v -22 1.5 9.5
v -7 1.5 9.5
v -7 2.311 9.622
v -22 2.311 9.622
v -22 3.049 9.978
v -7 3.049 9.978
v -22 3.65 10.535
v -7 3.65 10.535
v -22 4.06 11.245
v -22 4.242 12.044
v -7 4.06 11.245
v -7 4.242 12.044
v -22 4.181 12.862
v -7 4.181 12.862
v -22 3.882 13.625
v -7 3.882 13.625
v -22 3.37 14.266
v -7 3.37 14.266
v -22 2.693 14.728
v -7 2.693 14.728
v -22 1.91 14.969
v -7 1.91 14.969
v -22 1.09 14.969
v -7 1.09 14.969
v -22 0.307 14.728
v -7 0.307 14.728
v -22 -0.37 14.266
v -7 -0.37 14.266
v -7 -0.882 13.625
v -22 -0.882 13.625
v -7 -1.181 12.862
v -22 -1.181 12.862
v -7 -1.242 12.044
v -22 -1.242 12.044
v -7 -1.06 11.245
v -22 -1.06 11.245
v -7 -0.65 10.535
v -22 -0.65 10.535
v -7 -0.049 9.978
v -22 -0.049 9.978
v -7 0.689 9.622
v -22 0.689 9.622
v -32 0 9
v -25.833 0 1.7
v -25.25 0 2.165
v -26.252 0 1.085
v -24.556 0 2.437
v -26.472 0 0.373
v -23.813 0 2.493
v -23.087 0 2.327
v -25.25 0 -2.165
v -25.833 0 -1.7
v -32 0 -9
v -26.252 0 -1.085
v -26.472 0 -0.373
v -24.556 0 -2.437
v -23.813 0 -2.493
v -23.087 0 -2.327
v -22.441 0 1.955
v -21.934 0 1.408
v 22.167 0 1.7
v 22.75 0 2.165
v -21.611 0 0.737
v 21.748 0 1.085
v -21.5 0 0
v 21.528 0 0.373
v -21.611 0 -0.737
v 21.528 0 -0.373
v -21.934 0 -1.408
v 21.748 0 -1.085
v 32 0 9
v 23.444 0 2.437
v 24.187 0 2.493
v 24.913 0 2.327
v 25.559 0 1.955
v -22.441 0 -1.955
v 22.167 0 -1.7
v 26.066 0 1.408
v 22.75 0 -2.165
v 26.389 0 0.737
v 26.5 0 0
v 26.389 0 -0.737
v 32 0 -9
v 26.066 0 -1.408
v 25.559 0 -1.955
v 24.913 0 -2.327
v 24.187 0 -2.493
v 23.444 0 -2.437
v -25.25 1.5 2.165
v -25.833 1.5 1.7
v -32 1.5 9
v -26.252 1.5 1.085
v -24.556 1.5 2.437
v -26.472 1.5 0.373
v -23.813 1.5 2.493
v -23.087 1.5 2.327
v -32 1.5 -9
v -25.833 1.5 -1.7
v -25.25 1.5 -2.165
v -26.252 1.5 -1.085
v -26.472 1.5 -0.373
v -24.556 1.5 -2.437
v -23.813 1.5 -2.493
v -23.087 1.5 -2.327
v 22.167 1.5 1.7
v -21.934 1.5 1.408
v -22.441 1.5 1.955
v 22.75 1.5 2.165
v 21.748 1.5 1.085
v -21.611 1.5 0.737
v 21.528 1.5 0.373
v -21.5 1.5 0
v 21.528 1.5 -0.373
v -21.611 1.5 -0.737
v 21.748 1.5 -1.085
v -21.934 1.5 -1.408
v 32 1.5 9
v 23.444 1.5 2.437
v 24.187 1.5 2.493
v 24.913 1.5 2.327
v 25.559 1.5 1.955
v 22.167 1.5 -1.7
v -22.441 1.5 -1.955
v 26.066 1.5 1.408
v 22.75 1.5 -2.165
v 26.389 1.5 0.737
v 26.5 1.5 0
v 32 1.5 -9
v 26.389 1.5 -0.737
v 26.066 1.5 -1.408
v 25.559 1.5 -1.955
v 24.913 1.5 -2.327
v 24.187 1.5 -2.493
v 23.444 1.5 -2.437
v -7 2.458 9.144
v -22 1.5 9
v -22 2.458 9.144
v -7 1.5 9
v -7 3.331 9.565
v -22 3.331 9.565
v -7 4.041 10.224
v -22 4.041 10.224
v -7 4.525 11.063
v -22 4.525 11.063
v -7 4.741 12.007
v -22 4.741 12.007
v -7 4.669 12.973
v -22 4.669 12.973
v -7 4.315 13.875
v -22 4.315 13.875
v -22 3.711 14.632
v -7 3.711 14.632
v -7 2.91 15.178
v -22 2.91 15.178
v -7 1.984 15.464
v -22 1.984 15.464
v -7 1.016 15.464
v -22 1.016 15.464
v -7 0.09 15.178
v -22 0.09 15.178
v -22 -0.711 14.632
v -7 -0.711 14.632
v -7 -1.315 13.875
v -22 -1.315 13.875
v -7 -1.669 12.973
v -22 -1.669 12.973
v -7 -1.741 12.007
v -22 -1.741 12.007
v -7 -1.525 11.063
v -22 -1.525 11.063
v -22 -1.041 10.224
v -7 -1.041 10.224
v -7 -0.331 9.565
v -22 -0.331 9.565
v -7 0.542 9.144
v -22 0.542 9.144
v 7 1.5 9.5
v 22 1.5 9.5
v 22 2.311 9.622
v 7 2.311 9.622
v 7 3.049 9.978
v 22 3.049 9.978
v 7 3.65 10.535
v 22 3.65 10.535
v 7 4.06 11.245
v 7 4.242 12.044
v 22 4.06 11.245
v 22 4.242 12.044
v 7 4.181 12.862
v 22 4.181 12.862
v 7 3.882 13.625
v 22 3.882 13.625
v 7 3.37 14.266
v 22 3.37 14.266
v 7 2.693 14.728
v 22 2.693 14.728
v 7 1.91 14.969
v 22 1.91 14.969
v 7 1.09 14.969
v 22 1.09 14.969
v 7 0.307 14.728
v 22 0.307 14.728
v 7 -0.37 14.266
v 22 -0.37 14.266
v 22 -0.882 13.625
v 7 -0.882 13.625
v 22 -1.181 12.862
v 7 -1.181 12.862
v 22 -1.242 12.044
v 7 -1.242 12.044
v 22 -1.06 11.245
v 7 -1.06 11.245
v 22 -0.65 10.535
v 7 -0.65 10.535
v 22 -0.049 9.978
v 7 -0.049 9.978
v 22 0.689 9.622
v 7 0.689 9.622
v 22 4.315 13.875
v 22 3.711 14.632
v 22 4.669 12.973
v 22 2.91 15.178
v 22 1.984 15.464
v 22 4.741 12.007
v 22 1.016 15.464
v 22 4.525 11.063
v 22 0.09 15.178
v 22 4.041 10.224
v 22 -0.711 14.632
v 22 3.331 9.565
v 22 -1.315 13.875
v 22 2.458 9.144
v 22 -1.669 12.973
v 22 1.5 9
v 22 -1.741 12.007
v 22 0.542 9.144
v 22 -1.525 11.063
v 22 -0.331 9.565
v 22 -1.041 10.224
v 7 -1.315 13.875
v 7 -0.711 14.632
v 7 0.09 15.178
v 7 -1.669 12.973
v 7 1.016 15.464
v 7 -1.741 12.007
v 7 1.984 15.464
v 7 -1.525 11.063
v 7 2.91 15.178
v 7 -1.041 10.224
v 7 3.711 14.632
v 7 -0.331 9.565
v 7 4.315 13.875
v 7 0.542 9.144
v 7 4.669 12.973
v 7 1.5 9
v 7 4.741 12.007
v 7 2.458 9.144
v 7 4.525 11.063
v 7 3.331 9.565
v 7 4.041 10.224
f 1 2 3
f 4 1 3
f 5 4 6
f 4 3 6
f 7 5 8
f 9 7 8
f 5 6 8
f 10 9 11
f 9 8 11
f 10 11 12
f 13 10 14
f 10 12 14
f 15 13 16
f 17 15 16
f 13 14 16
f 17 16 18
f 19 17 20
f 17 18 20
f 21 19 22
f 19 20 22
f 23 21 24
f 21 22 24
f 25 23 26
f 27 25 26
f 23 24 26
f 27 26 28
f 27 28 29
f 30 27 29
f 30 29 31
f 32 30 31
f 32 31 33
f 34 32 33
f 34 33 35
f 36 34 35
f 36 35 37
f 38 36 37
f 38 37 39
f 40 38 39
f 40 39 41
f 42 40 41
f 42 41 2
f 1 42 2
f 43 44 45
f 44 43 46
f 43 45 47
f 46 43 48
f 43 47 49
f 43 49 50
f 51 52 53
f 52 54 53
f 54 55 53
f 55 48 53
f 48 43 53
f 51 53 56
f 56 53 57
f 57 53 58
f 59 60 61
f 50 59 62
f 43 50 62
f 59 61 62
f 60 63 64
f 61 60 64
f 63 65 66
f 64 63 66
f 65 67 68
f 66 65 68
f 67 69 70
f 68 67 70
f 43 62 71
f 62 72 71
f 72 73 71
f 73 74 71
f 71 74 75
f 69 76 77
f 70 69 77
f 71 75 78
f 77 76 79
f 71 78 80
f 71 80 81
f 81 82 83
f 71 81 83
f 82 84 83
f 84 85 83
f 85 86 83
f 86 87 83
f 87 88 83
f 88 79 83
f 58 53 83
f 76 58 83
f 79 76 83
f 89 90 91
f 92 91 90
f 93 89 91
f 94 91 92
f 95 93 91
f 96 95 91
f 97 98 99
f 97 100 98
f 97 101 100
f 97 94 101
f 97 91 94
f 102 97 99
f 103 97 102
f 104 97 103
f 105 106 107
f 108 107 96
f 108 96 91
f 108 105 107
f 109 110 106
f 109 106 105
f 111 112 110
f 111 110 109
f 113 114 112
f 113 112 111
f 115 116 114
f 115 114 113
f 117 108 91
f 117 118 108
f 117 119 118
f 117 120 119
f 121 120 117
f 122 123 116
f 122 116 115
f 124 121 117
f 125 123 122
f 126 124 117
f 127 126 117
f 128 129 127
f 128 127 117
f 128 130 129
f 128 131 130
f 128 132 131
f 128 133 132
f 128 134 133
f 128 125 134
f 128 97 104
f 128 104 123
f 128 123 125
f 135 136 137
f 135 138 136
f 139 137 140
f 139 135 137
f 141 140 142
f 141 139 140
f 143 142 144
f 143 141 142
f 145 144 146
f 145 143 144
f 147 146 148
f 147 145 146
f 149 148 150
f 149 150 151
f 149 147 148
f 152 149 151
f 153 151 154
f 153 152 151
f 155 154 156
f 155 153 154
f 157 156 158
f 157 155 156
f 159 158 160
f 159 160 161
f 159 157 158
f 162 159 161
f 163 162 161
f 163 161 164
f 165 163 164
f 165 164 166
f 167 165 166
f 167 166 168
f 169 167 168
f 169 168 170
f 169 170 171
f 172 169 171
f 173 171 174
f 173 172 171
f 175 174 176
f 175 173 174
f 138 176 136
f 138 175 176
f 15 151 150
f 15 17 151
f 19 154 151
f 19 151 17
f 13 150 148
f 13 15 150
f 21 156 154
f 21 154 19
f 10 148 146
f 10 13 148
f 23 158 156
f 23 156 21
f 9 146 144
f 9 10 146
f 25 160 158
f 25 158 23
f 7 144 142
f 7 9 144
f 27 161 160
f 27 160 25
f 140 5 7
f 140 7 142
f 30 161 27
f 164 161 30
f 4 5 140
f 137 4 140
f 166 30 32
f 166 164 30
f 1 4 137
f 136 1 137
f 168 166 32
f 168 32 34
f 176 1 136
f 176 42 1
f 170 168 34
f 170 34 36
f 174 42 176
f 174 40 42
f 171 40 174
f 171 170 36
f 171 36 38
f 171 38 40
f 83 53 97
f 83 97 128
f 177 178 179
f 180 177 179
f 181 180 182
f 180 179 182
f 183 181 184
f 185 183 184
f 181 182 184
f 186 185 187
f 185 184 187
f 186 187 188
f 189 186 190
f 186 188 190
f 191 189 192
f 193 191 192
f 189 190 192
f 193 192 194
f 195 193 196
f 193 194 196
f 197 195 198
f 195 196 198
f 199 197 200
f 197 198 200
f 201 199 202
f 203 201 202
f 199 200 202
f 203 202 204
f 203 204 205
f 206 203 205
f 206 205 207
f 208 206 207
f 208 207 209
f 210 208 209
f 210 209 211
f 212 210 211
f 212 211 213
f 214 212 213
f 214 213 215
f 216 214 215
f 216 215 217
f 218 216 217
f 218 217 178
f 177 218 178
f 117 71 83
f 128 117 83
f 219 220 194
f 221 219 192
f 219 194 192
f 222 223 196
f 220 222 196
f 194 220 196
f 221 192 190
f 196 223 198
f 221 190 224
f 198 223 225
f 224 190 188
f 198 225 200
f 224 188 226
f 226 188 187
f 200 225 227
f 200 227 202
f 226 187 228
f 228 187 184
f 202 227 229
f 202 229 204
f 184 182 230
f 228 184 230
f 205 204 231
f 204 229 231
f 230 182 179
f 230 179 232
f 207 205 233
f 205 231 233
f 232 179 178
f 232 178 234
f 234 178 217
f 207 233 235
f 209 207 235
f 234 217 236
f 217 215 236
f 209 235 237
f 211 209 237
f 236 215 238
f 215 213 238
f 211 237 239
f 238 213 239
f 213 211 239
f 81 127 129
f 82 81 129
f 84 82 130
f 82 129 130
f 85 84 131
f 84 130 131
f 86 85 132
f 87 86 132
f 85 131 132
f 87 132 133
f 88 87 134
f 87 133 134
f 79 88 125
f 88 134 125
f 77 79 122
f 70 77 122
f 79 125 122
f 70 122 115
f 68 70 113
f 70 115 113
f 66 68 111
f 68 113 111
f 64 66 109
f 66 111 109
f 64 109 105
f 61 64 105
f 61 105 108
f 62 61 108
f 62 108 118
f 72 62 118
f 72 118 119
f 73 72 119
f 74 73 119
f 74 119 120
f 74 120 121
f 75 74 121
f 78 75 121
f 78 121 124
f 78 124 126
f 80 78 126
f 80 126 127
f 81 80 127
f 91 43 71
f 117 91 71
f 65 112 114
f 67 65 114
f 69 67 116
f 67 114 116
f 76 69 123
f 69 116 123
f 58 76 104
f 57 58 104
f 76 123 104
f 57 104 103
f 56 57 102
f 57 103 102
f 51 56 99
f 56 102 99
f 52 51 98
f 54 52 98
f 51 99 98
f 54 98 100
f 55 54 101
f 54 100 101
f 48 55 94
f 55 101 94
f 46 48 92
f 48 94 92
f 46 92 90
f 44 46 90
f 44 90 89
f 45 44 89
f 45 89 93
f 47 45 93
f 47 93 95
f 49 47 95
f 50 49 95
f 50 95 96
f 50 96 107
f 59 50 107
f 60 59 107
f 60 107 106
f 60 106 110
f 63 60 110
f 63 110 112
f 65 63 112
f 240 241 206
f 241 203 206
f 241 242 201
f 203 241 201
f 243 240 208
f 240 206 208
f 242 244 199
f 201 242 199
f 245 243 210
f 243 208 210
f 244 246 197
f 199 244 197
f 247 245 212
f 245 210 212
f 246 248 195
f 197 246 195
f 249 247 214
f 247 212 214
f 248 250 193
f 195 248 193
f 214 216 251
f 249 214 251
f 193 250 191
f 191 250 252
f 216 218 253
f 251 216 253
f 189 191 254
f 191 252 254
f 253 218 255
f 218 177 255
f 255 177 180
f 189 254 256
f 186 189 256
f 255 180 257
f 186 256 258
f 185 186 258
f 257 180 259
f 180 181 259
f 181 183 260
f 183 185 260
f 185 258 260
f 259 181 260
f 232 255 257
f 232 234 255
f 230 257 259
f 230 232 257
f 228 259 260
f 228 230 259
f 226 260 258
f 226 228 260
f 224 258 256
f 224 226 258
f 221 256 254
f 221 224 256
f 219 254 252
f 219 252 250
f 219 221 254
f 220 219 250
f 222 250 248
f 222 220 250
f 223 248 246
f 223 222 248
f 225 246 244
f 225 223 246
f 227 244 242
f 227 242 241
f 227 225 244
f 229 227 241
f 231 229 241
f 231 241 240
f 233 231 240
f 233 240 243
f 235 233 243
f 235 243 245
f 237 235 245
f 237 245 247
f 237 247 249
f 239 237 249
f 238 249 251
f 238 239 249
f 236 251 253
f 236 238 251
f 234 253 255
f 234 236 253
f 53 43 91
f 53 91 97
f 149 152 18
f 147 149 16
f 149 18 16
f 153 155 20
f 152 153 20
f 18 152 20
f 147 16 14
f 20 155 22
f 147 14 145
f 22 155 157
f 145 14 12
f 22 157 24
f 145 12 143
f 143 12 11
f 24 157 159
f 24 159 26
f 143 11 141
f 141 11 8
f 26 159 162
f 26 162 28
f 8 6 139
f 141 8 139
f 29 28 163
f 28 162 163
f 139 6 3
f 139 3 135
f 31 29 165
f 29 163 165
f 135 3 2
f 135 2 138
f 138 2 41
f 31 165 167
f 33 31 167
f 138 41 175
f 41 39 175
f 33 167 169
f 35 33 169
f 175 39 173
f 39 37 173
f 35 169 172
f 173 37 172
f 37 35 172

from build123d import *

# Parameters (mm, degrees)
SKETCH1_W               = 64
SKETCH1_H               = 18
BOSS_EXTRUDE1_DEPTH     = 1.5
SKETCH2_R               = 3.25
BOSS_EXTRUDE2_DEPTH     = 32
SKETCH3_R               = 2.5
CUT_EXTRUDE1_DEPTH      = 10
SKETCH4_W               = 10
SKETCH4_H               = 6.5
SKETCH4_W_2             = 14
CUT_EXTRUDE2_DEPTH      = 10
CUT_EXTRUDE2_DEPTH_BACK = 10
SKETCH5_R               = 2.75
CUT_EXTRUDE3_DEPTH      = 44


with BuildPart() as part:
    # Sketch1 → Boss-Extrude1 (new body)
    with BuildSketch(Plane(origin=(0, 0, 0), x_dir=(1, 0, 0), z_dir=(0, 1, 0))):
        Rectangle(SKETCH1_W, SKETCH1_H)
    extrude(amount=BOSS_EXTRUDE1_DEPTH)

    # Sketch3 → Cut-Extrude1 (cut)
    with BuildSketch(Plane(origin=(0, 1.5, 0), x_dir=(1, 0, 0), z_dir=(0, 1, 0))):
        with Locations((-24, 0)):
            Circle(SKETCH3_R)
        with Locations((24, 0)):
            Circle(SKETCH3_R)
    extrude(amount=-CUT_EXTRUDE1_DEPTH, mode=Mode.SUBTRACT)


with BuildPart() as body_2:
    # Sketch2 → Boss-Extrude2 (new body, symmetric)
    with BuildSketch(Plane(origin=(0, 0, 0), x_dir=(0, 0, -1), z_dir=(1, 0, 0))):
        with Locations((-12.25, 1.5)):
            Circle(SKETCH2_R)
    extrude(amount=BOSS_EXTRUDE2_DEPTH, both=True)

    # Sketch4 → Cut-Extrude2 (cut, two sides)
    with BuildSketch(Plane(origin=(0, 0, 0), x_dir=(1, 0, 0), z_dir=(0, 1, 0))) as cut_extrude2_sk:
        with Locations((-27, -12.25)):
            Rectangle(SKETCH4_W, SKETCH4_H)
        with Locations((27, -12.25)):
            Rectangle(SKETCH4_W, SKETCH4_H)
        with Locations((0, -12.25)):
            Rectangle(SKETCH4_W_2, SKETCH4_H)
    extrude(amount=CUT_EXTRUDE2_DEPTH, mode=Mode.SUBTRACT)
    extrude(cut_extrude2_sk.sketch, amount=-CUT_EXTRUDE2_DEPTH_BACK, mode=Mode.SUBTRACT)

    # Sketch5 → Cut-Extrude3 (cut)
    with BuildSketch(Plane(origin=(22, 0, 0), x_dir=(0, 0, -1), z_dir=(1, 0, 0))):
        with Locations((-12.25, 1.5)):
            Circle(SKETCH5_R)
    extrude(amount=-CUT_EXTRUDE3_DEPTH, mode=Mode.SUBTRACT)


solid = Compound([part.part, body_2.part])
